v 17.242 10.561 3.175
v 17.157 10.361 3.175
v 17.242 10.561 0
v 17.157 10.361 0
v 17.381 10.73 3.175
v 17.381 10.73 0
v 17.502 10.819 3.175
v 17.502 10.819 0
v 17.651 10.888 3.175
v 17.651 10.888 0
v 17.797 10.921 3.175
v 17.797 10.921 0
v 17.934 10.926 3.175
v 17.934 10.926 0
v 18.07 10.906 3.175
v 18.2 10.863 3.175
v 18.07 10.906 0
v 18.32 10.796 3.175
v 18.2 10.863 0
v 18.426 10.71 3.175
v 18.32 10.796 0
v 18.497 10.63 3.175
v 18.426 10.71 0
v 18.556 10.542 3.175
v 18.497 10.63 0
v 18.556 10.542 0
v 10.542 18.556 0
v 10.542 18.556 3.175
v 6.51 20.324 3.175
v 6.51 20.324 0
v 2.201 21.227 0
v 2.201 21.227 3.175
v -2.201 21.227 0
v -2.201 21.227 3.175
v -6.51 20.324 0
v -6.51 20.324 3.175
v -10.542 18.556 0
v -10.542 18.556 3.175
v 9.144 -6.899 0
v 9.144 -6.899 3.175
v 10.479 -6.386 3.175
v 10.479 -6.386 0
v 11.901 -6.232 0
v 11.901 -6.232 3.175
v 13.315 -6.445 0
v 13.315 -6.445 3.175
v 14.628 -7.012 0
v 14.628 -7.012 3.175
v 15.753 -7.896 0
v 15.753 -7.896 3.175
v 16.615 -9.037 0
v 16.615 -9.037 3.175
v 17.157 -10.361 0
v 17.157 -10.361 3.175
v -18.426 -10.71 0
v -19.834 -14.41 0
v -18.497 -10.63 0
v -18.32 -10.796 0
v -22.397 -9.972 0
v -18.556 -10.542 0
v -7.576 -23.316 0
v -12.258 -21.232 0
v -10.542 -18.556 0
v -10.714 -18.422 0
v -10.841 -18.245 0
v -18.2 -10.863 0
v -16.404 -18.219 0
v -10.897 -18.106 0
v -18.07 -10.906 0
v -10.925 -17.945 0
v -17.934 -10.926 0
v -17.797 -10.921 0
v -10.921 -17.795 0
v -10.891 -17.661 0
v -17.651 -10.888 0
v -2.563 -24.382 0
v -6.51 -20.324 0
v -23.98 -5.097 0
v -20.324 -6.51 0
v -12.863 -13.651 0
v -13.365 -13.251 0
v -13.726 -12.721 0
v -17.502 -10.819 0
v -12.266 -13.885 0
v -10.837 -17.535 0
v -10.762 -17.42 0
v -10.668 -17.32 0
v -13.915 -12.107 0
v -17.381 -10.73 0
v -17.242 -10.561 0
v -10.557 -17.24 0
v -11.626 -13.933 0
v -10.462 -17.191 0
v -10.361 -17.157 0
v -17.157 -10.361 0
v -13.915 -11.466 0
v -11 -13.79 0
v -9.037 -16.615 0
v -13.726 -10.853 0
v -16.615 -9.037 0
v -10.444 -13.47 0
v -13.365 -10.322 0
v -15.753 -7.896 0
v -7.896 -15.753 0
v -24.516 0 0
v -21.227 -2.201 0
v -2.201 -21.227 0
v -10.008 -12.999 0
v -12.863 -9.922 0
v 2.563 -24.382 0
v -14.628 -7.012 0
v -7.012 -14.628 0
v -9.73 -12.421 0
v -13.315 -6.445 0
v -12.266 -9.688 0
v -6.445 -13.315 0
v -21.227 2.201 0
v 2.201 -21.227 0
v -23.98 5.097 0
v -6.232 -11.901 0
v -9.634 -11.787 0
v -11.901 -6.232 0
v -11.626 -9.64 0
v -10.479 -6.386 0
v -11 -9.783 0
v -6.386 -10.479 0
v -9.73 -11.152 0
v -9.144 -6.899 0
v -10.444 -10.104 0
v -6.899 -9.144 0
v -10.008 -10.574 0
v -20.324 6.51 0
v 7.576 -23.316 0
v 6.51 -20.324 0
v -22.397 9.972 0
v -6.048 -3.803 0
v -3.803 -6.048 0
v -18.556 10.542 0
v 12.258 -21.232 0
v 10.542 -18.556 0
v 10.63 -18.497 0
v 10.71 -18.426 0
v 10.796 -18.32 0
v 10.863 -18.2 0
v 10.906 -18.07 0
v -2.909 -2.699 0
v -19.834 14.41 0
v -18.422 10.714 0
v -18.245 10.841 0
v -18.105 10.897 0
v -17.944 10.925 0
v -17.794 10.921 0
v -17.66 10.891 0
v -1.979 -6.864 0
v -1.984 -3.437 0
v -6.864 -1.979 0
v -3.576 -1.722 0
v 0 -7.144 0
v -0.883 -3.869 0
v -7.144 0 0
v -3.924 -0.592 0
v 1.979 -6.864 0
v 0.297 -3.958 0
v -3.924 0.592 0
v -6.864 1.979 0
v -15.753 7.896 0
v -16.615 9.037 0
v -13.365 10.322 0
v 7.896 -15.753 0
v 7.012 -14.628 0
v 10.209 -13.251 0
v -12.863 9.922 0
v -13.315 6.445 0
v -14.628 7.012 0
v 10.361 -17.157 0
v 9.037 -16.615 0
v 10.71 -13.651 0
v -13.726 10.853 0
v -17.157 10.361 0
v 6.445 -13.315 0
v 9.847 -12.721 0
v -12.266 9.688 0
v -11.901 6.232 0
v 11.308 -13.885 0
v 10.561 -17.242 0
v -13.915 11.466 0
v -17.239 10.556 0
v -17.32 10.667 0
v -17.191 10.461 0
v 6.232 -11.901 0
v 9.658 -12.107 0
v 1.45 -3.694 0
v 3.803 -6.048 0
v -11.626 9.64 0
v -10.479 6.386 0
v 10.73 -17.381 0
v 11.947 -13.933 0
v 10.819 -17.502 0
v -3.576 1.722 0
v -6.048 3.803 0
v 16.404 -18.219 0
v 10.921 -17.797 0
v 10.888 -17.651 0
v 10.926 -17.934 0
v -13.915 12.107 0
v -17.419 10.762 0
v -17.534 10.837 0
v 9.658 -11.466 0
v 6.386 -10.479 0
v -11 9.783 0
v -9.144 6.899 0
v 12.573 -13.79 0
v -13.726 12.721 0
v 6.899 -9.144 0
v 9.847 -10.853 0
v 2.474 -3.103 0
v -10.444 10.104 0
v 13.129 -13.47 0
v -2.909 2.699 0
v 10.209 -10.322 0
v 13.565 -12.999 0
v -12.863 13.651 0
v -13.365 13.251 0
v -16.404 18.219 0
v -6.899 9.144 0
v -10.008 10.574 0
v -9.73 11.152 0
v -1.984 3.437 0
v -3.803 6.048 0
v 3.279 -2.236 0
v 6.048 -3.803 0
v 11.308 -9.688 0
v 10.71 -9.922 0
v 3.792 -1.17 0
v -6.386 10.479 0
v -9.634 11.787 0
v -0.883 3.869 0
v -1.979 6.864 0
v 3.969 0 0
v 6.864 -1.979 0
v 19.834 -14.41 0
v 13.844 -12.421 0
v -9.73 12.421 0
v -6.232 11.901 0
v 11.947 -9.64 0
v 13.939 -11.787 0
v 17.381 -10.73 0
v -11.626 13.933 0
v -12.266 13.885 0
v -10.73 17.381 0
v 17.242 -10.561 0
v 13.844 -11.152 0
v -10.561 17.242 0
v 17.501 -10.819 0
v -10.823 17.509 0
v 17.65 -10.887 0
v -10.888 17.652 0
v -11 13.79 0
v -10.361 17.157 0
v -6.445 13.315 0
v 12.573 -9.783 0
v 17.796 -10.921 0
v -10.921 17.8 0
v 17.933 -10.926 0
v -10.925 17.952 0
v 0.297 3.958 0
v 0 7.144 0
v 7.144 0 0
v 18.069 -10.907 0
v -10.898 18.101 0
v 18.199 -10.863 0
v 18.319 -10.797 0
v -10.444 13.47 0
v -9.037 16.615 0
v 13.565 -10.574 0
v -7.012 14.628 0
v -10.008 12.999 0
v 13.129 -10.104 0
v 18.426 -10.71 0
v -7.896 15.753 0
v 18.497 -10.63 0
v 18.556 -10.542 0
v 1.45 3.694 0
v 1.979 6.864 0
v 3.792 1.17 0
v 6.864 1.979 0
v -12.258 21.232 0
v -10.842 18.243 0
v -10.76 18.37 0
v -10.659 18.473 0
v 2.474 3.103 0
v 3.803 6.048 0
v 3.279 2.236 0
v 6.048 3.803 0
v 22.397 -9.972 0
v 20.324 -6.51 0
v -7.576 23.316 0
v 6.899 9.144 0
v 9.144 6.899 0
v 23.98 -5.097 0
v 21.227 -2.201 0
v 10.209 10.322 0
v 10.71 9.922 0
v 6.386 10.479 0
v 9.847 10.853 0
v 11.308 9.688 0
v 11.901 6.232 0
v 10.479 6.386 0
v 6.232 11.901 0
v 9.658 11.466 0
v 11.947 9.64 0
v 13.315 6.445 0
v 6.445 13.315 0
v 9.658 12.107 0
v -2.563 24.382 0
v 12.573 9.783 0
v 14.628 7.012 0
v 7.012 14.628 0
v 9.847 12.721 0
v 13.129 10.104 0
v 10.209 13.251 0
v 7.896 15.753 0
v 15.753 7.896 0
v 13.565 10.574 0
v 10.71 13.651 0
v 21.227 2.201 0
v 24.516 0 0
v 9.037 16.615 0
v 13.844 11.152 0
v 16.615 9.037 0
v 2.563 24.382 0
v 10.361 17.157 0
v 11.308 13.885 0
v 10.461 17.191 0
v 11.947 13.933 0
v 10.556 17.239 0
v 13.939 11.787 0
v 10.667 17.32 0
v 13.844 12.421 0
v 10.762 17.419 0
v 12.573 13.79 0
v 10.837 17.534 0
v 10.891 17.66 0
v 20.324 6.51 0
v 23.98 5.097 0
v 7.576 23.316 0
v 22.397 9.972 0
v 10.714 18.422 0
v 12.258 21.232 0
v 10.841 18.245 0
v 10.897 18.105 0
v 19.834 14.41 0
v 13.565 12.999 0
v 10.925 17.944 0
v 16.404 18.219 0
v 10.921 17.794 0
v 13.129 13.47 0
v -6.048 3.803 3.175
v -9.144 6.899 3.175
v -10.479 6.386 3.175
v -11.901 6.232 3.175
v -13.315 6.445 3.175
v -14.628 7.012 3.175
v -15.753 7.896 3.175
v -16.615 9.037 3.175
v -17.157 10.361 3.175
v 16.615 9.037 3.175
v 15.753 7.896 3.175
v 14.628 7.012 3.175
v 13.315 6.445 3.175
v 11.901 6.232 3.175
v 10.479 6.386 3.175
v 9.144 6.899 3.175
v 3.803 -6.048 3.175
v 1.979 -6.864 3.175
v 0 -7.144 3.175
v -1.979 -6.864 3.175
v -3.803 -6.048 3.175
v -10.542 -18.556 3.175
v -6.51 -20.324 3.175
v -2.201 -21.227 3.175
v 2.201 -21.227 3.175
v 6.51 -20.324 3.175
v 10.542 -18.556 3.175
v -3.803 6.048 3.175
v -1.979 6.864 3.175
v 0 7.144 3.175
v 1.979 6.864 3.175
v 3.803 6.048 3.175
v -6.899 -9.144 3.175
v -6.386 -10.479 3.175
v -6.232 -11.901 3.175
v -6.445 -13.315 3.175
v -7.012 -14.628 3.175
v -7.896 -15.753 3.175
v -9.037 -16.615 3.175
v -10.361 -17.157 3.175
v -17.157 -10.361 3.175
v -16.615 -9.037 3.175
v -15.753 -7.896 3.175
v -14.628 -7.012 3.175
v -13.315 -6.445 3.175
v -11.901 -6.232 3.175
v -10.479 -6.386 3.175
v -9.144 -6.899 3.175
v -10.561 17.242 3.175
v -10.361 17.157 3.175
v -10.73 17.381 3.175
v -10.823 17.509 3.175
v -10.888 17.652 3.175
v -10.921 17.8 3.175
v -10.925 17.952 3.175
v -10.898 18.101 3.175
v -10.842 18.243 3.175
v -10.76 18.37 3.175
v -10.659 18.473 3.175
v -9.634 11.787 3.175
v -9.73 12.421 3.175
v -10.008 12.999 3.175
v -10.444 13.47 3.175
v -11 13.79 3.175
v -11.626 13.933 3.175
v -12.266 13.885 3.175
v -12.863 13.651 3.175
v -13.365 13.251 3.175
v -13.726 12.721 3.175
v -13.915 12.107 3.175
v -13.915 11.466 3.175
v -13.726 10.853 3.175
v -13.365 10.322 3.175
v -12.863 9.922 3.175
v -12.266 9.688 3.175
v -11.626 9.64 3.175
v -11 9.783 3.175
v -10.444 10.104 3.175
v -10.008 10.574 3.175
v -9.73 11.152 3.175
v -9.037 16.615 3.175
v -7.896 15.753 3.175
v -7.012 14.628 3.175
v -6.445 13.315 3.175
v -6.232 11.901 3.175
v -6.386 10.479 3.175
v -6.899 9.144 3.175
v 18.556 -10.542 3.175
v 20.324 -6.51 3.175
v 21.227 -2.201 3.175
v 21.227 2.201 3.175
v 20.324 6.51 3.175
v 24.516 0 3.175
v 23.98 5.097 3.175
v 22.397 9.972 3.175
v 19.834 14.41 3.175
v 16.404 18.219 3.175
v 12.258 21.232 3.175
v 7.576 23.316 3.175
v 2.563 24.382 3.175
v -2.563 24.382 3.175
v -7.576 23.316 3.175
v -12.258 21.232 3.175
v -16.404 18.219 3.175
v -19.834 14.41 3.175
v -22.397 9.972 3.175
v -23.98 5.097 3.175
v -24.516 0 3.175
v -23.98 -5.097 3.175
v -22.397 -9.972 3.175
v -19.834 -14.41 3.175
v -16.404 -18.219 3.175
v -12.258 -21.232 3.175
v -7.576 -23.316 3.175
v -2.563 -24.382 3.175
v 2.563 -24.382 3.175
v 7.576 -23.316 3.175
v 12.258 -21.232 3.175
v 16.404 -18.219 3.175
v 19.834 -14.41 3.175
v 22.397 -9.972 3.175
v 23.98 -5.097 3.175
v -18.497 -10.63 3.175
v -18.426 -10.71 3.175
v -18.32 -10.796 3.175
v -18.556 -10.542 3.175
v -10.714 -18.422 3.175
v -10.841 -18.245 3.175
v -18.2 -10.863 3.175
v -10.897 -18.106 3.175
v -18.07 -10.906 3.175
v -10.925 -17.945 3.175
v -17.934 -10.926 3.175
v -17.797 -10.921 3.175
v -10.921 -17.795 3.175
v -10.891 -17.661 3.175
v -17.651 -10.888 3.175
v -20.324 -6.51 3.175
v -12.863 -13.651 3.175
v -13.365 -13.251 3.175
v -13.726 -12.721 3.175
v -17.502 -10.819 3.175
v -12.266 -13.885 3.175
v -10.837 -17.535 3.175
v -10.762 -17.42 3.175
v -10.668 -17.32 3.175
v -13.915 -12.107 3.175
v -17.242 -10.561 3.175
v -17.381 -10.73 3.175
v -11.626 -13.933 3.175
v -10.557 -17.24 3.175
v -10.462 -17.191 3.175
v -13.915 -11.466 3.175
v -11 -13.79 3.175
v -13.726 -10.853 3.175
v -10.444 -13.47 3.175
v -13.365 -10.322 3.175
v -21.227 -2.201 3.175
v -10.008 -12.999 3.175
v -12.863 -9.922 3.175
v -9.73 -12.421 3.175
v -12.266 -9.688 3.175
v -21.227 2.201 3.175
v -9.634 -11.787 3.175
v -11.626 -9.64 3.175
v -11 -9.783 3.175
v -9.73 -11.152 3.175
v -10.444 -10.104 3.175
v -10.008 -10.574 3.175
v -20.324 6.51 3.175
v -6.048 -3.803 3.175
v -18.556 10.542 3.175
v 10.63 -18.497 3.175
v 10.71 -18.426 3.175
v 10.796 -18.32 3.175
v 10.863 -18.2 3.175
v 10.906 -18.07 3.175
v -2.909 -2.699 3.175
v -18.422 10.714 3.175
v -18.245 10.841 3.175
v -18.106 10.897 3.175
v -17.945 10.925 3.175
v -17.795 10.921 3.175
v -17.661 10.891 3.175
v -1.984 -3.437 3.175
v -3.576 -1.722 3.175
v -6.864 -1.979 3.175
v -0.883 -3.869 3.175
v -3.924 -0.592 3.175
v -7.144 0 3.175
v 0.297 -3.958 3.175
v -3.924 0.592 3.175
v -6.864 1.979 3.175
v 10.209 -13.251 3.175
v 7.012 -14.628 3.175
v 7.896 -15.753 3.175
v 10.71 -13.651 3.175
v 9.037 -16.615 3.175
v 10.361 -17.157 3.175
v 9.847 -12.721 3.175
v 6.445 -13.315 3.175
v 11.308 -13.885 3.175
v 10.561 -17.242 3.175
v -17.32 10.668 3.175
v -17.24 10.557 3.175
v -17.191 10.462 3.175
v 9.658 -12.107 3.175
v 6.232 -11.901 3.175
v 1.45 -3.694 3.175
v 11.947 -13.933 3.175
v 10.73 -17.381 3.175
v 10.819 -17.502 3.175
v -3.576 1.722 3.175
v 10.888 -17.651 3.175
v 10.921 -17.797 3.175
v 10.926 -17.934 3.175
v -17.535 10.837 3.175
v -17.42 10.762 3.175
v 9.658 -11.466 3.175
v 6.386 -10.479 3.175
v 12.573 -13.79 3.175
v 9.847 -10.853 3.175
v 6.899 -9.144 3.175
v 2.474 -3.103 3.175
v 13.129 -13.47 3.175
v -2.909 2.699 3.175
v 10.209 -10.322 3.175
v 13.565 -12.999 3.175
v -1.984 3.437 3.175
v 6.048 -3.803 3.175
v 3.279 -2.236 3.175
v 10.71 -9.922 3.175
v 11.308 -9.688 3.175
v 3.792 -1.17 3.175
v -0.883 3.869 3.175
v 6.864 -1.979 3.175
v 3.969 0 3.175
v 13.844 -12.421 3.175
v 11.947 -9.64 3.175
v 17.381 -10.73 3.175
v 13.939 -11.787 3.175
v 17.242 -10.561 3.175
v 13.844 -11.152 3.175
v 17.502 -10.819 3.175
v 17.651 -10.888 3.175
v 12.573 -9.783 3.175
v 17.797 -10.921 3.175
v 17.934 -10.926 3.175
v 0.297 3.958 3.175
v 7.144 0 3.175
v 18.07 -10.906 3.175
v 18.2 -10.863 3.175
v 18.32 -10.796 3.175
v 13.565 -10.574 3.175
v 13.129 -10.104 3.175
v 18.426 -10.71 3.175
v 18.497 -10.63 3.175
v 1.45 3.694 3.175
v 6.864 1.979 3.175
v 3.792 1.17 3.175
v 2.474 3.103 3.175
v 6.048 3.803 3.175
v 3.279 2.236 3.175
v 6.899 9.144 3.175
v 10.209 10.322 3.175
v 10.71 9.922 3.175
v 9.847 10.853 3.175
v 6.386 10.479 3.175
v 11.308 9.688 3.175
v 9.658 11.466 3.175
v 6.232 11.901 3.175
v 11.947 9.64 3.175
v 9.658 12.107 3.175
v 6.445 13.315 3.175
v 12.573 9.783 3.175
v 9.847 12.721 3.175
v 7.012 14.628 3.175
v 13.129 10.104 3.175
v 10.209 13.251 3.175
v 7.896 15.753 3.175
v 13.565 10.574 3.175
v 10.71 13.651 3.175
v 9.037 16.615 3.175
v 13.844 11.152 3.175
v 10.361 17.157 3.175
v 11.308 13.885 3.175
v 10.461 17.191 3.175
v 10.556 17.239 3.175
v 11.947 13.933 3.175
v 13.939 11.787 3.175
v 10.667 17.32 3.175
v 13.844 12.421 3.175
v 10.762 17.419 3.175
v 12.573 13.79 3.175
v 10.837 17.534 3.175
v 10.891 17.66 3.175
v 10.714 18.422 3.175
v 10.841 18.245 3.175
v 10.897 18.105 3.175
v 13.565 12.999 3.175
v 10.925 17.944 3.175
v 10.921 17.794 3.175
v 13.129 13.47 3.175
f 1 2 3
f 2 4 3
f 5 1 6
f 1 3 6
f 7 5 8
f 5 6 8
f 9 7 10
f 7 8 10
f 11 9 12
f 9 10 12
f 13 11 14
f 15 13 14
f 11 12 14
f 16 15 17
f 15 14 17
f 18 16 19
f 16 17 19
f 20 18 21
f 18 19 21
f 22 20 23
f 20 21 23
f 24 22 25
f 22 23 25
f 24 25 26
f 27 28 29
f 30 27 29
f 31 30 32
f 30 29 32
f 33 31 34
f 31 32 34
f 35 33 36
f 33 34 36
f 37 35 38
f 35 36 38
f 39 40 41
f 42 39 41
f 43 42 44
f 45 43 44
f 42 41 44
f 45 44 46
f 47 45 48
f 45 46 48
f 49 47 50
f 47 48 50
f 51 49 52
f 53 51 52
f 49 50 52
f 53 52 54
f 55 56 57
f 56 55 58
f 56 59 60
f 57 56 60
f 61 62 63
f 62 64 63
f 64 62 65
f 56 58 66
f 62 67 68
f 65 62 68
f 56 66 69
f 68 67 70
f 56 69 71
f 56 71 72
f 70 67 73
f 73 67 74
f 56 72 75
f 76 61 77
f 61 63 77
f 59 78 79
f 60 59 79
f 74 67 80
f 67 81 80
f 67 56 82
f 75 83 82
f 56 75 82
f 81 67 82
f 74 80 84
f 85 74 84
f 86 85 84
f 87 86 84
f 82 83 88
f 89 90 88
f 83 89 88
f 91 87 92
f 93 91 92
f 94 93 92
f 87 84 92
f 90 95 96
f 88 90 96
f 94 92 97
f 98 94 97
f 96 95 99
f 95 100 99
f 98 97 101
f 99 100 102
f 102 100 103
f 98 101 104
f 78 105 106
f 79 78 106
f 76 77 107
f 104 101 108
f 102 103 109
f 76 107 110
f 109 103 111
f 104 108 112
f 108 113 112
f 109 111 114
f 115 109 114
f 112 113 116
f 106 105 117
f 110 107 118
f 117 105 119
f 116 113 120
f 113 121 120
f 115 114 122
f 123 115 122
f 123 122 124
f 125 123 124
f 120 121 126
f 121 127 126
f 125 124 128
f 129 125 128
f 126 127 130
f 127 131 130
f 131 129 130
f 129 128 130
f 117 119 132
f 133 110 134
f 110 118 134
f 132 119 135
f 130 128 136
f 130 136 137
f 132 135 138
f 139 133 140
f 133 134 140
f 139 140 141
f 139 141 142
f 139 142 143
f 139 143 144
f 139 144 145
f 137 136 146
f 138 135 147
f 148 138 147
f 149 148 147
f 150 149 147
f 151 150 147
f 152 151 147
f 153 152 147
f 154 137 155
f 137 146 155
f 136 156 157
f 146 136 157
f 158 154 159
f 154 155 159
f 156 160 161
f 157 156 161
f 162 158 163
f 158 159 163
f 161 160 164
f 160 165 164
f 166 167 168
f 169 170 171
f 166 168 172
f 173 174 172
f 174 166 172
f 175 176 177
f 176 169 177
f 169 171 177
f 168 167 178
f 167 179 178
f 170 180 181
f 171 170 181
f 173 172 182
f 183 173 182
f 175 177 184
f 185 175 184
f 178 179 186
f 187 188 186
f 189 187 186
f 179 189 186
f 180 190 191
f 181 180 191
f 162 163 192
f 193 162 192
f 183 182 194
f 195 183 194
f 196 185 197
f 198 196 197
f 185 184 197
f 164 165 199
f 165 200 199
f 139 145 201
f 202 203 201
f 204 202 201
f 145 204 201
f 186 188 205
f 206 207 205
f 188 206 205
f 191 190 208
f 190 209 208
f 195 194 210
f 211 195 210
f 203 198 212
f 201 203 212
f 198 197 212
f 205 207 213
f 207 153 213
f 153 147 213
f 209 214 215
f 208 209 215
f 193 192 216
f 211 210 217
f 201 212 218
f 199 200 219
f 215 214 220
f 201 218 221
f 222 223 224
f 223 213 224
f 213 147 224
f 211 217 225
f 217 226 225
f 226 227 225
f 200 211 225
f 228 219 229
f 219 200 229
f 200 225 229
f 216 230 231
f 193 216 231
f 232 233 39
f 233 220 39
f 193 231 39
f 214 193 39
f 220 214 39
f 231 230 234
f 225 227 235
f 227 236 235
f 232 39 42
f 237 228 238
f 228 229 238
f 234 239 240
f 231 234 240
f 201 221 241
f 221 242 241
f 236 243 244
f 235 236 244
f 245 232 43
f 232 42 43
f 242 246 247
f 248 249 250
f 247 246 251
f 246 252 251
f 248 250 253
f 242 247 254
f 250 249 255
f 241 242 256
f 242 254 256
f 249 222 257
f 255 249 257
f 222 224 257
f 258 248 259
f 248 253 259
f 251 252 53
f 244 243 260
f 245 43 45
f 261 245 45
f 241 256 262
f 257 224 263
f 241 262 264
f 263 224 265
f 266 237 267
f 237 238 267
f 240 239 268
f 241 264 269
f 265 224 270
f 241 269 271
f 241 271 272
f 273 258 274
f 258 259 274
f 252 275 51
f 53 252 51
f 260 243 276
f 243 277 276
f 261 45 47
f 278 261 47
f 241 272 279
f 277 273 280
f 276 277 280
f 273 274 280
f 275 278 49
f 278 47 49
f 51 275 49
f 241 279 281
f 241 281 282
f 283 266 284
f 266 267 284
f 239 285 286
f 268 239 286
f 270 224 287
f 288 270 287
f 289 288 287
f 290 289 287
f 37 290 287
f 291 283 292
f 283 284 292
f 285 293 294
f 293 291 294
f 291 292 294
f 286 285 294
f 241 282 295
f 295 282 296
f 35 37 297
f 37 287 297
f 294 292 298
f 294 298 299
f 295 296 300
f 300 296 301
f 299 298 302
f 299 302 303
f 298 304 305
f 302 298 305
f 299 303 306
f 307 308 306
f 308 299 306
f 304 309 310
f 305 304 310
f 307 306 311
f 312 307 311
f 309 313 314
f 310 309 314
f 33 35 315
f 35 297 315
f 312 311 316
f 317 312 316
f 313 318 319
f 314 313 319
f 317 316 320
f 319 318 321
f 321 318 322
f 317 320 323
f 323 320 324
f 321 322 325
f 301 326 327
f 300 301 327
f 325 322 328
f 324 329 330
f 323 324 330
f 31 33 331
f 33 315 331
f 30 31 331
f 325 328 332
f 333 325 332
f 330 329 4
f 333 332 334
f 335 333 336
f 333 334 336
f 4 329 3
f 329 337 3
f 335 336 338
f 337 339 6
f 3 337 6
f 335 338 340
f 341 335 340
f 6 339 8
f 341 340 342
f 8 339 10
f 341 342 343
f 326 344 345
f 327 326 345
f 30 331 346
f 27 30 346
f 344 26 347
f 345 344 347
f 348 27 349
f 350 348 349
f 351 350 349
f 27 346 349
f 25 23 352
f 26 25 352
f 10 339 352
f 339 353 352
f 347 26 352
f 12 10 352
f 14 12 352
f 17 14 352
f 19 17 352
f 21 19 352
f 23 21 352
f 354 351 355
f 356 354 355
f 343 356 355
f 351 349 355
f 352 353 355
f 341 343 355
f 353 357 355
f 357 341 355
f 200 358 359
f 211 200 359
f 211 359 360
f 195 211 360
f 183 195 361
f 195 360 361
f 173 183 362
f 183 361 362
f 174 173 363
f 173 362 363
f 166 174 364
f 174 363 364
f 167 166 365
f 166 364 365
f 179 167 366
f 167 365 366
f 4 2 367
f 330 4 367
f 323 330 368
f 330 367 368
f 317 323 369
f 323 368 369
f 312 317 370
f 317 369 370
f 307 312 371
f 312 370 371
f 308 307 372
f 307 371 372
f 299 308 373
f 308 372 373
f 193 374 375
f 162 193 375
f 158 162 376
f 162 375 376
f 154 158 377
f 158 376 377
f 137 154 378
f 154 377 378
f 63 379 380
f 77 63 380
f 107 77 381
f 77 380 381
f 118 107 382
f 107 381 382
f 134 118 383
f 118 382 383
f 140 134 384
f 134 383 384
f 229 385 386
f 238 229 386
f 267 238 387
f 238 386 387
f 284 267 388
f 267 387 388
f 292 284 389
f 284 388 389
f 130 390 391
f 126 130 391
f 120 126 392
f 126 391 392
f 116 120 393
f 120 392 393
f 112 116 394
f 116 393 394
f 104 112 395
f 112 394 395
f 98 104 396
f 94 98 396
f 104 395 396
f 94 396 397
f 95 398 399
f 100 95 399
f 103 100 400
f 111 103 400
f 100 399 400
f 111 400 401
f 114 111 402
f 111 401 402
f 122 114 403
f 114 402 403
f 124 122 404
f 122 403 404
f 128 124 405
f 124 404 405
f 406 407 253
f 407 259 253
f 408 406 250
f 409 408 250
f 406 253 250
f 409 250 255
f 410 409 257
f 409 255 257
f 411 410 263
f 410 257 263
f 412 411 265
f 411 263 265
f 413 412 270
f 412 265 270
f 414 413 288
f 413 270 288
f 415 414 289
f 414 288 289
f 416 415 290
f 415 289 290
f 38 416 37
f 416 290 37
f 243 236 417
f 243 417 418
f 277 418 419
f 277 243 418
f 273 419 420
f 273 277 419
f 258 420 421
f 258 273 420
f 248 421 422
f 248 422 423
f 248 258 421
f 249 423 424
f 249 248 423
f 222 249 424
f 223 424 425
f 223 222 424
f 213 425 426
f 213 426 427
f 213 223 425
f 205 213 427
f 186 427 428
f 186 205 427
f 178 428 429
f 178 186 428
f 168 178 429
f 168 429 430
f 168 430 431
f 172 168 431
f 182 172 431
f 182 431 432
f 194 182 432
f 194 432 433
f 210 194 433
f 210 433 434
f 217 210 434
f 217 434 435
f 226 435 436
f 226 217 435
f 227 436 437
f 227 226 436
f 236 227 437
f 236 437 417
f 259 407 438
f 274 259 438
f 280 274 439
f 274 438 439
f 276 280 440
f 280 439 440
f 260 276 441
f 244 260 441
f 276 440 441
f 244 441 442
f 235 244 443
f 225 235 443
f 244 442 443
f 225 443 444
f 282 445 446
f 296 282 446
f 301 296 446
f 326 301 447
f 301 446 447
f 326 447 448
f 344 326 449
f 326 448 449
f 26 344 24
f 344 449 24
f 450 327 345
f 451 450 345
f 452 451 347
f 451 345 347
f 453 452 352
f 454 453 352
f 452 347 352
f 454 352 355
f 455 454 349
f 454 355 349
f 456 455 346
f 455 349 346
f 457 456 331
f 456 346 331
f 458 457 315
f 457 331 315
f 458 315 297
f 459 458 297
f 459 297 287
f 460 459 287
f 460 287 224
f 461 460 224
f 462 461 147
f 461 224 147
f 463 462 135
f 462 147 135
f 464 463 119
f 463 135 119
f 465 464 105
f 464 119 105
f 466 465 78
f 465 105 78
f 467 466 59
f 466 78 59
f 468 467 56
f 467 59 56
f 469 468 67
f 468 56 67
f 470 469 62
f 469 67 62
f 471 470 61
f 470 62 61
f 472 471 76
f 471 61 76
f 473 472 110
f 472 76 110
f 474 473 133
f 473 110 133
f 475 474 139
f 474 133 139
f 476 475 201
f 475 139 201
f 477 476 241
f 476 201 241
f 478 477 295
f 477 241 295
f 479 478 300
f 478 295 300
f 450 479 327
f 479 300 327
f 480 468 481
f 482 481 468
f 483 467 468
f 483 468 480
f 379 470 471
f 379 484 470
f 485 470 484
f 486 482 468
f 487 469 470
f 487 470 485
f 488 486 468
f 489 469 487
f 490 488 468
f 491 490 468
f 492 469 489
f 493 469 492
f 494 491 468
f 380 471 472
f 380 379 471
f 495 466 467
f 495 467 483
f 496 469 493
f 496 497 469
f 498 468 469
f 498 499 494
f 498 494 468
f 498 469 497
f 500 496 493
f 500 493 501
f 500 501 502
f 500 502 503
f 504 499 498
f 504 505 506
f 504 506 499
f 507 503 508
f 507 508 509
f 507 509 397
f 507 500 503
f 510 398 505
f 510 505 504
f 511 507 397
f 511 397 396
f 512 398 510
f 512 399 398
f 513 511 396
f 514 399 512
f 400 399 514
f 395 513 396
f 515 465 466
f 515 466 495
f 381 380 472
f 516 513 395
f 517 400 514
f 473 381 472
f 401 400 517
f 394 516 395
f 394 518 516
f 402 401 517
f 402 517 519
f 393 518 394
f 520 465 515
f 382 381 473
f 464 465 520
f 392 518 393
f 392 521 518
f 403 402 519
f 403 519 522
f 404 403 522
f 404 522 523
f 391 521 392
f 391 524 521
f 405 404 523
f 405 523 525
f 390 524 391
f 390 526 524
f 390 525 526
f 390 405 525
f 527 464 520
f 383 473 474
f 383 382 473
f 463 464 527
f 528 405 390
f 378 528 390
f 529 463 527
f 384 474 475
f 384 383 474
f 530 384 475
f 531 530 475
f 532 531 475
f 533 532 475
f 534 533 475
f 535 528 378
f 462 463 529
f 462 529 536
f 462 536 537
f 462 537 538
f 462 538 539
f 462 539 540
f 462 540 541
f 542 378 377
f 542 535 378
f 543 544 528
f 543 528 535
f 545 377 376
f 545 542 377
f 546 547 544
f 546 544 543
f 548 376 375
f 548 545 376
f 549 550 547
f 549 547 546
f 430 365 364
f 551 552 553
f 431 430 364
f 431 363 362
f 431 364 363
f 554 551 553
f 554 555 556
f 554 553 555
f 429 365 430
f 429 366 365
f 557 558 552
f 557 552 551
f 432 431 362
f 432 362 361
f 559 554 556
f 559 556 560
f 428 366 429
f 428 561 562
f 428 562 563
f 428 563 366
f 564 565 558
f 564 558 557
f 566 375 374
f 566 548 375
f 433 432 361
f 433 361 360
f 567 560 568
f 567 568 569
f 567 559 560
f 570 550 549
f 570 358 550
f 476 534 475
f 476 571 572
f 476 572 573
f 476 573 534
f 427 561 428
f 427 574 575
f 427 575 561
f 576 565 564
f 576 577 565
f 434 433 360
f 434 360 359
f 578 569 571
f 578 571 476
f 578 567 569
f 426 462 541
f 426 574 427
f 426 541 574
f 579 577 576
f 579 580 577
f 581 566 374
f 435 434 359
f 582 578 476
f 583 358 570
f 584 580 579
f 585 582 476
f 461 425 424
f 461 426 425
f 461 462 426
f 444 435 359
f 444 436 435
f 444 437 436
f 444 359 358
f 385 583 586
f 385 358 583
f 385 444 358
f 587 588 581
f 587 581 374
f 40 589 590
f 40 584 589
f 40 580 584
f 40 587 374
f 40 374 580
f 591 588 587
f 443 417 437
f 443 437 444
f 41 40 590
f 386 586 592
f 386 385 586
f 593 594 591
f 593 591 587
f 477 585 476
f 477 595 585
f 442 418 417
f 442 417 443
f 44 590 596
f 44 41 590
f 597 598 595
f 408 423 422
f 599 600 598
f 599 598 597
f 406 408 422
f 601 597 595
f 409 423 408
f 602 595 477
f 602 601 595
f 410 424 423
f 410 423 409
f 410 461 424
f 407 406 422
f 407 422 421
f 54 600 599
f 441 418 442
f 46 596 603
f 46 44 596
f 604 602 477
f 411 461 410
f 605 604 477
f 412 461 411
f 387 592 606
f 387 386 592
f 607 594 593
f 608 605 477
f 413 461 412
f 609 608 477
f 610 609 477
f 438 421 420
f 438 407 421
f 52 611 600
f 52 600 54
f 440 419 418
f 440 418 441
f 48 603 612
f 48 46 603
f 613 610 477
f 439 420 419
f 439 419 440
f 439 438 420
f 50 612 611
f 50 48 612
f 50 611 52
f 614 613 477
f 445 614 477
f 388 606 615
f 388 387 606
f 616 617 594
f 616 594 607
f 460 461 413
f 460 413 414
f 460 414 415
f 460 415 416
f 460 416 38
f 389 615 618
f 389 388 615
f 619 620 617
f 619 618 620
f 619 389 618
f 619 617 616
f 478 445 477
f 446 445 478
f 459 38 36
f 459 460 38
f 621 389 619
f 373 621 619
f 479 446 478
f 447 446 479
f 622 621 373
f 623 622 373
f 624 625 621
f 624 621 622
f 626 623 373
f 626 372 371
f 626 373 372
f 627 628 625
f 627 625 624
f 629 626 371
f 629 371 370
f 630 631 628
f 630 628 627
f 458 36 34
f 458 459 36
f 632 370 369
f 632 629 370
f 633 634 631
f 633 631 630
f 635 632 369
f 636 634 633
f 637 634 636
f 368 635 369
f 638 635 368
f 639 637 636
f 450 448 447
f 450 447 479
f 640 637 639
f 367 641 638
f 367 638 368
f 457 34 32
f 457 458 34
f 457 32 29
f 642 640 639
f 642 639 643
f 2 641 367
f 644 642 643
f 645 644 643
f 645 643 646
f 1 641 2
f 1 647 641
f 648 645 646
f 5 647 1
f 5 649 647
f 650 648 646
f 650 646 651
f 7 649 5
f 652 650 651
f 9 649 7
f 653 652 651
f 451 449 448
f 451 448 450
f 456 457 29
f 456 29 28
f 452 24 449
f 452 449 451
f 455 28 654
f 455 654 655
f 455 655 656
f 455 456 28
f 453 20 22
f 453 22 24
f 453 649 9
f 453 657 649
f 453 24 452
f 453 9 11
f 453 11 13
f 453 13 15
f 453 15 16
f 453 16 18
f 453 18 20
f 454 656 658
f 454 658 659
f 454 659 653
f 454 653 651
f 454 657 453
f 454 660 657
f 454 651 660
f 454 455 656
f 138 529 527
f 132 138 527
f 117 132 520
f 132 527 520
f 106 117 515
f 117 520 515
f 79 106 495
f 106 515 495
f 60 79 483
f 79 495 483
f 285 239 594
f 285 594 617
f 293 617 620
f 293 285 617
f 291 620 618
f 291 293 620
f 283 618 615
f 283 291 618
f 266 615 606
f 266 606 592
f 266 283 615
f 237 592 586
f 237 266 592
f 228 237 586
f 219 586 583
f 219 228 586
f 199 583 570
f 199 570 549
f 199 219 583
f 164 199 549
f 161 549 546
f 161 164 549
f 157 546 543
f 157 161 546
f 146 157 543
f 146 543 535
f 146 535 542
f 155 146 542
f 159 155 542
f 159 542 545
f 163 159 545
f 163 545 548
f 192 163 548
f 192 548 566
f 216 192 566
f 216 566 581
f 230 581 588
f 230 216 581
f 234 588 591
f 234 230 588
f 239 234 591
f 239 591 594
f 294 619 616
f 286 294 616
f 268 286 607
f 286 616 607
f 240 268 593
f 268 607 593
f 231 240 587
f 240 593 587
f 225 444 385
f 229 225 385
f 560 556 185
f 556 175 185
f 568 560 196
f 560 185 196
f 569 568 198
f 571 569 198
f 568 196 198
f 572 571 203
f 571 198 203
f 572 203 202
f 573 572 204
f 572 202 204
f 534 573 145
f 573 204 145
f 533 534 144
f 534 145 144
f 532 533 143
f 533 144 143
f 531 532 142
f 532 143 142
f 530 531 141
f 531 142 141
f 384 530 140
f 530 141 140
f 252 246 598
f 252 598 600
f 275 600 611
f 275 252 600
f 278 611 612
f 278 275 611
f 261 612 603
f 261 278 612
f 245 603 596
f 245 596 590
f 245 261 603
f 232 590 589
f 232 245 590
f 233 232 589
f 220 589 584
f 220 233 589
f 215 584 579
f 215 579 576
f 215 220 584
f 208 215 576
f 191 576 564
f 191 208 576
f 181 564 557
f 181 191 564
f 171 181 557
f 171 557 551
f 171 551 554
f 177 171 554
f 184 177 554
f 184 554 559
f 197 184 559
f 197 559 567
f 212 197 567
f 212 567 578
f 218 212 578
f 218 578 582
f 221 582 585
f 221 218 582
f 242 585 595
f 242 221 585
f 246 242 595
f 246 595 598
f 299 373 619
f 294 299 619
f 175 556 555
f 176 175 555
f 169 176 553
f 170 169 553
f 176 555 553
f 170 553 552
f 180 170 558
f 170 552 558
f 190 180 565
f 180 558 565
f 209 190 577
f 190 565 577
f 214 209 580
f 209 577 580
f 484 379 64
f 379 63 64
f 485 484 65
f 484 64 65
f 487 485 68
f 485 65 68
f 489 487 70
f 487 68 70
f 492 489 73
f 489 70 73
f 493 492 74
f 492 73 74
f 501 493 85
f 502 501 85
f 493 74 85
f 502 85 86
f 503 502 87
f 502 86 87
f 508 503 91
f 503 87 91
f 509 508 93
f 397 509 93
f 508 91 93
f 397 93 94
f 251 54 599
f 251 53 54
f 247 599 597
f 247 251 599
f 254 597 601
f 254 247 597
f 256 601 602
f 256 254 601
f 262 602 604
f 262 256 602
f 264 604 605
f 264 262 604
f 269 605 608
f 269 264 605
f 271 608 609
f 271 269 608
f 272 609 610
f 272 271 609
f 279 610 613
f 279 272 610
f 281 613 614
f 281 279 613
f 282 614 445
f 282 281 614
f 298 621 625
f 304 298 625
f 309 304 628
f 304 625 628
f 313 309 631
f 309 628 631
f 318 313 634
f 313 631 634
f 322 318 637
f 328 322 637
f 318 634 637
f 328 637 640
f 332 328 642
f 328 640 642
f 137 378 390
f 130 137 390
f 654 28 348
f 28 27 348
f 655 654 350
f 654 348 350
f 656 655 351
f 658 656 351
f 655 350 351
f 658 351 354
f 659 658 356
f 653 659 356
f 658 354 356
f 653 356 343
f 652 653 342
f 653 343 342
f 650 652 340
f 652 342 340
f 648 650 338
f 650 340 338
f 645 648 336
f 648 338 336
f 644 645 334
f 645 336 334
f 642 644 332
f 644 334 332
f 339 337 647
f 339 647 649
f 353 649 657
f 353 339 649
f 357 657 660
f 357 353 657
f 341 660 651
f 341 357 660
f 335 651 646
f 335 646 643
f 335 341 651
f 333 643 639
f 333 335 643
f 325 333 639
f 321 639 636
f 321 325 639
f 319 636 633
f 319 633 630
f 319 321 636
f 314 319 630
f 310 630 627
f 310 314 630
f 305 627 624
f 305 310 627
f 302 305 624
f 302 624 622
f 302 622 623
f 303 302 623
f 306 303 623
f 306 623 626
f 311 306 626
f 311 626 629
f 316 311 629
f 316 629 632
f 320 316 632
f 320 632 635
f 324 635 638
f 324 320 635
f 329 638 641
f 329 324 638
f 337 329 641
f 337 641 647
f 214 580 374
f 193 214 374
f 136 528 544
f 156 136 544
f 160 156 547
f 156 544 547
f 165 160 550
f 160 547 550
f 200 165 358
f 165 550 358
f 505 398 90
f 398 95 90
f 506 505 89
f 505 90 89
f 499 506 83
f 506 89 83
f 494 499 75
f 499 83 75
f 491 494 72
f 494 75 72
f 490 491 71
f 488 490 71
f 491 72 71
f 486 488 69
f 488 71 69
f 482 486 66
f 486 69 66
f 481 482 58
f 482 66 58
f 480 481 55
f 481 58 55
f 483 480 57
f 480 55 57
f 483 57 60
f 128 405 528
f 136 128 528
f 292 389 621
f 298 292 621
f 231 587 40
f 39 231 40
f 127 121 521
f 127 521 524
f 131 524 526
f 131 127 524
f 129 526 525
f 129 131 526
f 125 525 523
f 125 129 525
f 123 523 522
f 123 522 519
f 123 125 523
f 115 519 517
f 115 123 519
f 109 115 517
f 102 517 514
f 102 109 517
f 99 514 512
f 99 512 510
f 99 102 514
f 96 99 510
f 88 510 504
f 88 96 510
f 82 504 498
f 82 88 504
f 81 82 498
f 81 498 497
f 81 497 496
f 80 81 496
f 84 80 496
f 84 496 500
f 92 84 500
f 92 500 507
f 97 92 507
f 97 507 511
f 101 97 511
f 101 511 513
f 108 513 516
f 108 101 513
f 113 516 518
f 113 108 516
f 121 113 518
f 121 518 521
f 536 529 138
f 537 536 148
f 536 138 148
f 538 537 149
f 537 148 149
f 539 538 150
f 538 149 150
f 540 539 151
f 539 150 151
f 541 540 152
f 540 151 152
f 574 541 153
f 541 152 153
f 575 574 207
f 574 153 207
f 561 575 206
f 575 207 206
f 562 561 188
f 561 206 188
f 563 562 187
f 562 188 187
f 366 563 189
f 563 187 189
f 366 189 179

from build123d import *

# Parameters (mm, degrees)
F0_R            = 24.51608
F0_R_2          = 2.15265
F0_R_3          = 3.96875
F1_DEPTH        = 3.175
F3_DEPTH        = 3.175
F3_COPIES_COUNT = 4
F4_R            = 0.762


# Not quite as in the source:
# - a pattern or mirror of a feature is missing from the dataset's text; its kind, count and spacing are read off the source's solid


with BuildPart() as f1:
    # F0 (on Top) → F1 (new body)
    with BuildSketch(Plane.XY):
        Circle(F0_R)
        with Locations((-11.7865906, -11.7865906)):
            Circle(F0_R_2, mode=Mode.SUBTRACT)
        with Locations((11.7865906, -11.7865906)):
            Circle(F0_R_2, mode=Mode.SUBTRACT)
        with Locations((-11.7865906, 11.7865906)):
            Circle(F0_R_2, mode=Mode.SUBTRACT)
        Circle(F0_R_3, mode=Mode.SUBTRACT)
        with Locations((11.7865906, 11.7865906)):
            Circle(F0_R_2, mode=Mode.SUBTRACT)
    extrude(amount=F1_DEPTH)

    # F2 (on face) → F3 (cut, through all)
    with BuildSketch(Plane.XY.offset(3.175)):
        with BuildLine():
            ThreePointArc((-12.5005198818, 17.2967828873), (-7.207099086, 14.9330444032), (-6.8989717457, 9.144035776))
            Line((-6.8989717457, 9.144035776), (-3.8025572131, 6.0476212434))
            ThreePointArc((-3.8025572131, 6.0476212434), (0, 7.14375), (3.8025572131, 6.0476212434))
            Line((3.8025572131, 6.0476212434), (6.8989717457, 9.144035776))
            ThreePointArc((6.8989717457, 9.144035776), (7.207099086, 14.9330444032), (12.5005198818, 17.2967828873))
            ThreePointArc((12.5005198818, 17.2967828873), (0, 21.34108), (-12.5005198818, 17.2967828873))
        make_face()
    f3 = extrude(amount=-F3_DEPTH, mode=Mode.SUBTRACT)

    # F3_copies: F3 ×4 about axis
    f3_copies_axis = Axis((0, 0, 0), (0, 0, 1))
    for i in range(1, F3_COPIES_COUNT):
        add(f3.rotate(f3_copies_axis, i * 360 / F3_COPIES_COUNT), mode=Mode.SUBTRACT)

    # F4
    f4_edges = [f1.edges().sort_by_distance(p)[0] for p in [
        (-12.50052, 17.296783, 1.5875),
        (12.50052, 17.296783, 1.5875),
        (12.50052, -17.296783, 1.5875),
        (-12.50052, -17.296783, 1.5875),
        (17.296783, 12.50052, 1.5875),
        (17.296783, -12.50052, 1.5875),
        (-17.296783, -12.50052, 1.5875),
        (-17.296783, 12.50052, 1.5875),
    ]]
    fillet(f4_edges, radius=F4_R)


solid = f1.part
